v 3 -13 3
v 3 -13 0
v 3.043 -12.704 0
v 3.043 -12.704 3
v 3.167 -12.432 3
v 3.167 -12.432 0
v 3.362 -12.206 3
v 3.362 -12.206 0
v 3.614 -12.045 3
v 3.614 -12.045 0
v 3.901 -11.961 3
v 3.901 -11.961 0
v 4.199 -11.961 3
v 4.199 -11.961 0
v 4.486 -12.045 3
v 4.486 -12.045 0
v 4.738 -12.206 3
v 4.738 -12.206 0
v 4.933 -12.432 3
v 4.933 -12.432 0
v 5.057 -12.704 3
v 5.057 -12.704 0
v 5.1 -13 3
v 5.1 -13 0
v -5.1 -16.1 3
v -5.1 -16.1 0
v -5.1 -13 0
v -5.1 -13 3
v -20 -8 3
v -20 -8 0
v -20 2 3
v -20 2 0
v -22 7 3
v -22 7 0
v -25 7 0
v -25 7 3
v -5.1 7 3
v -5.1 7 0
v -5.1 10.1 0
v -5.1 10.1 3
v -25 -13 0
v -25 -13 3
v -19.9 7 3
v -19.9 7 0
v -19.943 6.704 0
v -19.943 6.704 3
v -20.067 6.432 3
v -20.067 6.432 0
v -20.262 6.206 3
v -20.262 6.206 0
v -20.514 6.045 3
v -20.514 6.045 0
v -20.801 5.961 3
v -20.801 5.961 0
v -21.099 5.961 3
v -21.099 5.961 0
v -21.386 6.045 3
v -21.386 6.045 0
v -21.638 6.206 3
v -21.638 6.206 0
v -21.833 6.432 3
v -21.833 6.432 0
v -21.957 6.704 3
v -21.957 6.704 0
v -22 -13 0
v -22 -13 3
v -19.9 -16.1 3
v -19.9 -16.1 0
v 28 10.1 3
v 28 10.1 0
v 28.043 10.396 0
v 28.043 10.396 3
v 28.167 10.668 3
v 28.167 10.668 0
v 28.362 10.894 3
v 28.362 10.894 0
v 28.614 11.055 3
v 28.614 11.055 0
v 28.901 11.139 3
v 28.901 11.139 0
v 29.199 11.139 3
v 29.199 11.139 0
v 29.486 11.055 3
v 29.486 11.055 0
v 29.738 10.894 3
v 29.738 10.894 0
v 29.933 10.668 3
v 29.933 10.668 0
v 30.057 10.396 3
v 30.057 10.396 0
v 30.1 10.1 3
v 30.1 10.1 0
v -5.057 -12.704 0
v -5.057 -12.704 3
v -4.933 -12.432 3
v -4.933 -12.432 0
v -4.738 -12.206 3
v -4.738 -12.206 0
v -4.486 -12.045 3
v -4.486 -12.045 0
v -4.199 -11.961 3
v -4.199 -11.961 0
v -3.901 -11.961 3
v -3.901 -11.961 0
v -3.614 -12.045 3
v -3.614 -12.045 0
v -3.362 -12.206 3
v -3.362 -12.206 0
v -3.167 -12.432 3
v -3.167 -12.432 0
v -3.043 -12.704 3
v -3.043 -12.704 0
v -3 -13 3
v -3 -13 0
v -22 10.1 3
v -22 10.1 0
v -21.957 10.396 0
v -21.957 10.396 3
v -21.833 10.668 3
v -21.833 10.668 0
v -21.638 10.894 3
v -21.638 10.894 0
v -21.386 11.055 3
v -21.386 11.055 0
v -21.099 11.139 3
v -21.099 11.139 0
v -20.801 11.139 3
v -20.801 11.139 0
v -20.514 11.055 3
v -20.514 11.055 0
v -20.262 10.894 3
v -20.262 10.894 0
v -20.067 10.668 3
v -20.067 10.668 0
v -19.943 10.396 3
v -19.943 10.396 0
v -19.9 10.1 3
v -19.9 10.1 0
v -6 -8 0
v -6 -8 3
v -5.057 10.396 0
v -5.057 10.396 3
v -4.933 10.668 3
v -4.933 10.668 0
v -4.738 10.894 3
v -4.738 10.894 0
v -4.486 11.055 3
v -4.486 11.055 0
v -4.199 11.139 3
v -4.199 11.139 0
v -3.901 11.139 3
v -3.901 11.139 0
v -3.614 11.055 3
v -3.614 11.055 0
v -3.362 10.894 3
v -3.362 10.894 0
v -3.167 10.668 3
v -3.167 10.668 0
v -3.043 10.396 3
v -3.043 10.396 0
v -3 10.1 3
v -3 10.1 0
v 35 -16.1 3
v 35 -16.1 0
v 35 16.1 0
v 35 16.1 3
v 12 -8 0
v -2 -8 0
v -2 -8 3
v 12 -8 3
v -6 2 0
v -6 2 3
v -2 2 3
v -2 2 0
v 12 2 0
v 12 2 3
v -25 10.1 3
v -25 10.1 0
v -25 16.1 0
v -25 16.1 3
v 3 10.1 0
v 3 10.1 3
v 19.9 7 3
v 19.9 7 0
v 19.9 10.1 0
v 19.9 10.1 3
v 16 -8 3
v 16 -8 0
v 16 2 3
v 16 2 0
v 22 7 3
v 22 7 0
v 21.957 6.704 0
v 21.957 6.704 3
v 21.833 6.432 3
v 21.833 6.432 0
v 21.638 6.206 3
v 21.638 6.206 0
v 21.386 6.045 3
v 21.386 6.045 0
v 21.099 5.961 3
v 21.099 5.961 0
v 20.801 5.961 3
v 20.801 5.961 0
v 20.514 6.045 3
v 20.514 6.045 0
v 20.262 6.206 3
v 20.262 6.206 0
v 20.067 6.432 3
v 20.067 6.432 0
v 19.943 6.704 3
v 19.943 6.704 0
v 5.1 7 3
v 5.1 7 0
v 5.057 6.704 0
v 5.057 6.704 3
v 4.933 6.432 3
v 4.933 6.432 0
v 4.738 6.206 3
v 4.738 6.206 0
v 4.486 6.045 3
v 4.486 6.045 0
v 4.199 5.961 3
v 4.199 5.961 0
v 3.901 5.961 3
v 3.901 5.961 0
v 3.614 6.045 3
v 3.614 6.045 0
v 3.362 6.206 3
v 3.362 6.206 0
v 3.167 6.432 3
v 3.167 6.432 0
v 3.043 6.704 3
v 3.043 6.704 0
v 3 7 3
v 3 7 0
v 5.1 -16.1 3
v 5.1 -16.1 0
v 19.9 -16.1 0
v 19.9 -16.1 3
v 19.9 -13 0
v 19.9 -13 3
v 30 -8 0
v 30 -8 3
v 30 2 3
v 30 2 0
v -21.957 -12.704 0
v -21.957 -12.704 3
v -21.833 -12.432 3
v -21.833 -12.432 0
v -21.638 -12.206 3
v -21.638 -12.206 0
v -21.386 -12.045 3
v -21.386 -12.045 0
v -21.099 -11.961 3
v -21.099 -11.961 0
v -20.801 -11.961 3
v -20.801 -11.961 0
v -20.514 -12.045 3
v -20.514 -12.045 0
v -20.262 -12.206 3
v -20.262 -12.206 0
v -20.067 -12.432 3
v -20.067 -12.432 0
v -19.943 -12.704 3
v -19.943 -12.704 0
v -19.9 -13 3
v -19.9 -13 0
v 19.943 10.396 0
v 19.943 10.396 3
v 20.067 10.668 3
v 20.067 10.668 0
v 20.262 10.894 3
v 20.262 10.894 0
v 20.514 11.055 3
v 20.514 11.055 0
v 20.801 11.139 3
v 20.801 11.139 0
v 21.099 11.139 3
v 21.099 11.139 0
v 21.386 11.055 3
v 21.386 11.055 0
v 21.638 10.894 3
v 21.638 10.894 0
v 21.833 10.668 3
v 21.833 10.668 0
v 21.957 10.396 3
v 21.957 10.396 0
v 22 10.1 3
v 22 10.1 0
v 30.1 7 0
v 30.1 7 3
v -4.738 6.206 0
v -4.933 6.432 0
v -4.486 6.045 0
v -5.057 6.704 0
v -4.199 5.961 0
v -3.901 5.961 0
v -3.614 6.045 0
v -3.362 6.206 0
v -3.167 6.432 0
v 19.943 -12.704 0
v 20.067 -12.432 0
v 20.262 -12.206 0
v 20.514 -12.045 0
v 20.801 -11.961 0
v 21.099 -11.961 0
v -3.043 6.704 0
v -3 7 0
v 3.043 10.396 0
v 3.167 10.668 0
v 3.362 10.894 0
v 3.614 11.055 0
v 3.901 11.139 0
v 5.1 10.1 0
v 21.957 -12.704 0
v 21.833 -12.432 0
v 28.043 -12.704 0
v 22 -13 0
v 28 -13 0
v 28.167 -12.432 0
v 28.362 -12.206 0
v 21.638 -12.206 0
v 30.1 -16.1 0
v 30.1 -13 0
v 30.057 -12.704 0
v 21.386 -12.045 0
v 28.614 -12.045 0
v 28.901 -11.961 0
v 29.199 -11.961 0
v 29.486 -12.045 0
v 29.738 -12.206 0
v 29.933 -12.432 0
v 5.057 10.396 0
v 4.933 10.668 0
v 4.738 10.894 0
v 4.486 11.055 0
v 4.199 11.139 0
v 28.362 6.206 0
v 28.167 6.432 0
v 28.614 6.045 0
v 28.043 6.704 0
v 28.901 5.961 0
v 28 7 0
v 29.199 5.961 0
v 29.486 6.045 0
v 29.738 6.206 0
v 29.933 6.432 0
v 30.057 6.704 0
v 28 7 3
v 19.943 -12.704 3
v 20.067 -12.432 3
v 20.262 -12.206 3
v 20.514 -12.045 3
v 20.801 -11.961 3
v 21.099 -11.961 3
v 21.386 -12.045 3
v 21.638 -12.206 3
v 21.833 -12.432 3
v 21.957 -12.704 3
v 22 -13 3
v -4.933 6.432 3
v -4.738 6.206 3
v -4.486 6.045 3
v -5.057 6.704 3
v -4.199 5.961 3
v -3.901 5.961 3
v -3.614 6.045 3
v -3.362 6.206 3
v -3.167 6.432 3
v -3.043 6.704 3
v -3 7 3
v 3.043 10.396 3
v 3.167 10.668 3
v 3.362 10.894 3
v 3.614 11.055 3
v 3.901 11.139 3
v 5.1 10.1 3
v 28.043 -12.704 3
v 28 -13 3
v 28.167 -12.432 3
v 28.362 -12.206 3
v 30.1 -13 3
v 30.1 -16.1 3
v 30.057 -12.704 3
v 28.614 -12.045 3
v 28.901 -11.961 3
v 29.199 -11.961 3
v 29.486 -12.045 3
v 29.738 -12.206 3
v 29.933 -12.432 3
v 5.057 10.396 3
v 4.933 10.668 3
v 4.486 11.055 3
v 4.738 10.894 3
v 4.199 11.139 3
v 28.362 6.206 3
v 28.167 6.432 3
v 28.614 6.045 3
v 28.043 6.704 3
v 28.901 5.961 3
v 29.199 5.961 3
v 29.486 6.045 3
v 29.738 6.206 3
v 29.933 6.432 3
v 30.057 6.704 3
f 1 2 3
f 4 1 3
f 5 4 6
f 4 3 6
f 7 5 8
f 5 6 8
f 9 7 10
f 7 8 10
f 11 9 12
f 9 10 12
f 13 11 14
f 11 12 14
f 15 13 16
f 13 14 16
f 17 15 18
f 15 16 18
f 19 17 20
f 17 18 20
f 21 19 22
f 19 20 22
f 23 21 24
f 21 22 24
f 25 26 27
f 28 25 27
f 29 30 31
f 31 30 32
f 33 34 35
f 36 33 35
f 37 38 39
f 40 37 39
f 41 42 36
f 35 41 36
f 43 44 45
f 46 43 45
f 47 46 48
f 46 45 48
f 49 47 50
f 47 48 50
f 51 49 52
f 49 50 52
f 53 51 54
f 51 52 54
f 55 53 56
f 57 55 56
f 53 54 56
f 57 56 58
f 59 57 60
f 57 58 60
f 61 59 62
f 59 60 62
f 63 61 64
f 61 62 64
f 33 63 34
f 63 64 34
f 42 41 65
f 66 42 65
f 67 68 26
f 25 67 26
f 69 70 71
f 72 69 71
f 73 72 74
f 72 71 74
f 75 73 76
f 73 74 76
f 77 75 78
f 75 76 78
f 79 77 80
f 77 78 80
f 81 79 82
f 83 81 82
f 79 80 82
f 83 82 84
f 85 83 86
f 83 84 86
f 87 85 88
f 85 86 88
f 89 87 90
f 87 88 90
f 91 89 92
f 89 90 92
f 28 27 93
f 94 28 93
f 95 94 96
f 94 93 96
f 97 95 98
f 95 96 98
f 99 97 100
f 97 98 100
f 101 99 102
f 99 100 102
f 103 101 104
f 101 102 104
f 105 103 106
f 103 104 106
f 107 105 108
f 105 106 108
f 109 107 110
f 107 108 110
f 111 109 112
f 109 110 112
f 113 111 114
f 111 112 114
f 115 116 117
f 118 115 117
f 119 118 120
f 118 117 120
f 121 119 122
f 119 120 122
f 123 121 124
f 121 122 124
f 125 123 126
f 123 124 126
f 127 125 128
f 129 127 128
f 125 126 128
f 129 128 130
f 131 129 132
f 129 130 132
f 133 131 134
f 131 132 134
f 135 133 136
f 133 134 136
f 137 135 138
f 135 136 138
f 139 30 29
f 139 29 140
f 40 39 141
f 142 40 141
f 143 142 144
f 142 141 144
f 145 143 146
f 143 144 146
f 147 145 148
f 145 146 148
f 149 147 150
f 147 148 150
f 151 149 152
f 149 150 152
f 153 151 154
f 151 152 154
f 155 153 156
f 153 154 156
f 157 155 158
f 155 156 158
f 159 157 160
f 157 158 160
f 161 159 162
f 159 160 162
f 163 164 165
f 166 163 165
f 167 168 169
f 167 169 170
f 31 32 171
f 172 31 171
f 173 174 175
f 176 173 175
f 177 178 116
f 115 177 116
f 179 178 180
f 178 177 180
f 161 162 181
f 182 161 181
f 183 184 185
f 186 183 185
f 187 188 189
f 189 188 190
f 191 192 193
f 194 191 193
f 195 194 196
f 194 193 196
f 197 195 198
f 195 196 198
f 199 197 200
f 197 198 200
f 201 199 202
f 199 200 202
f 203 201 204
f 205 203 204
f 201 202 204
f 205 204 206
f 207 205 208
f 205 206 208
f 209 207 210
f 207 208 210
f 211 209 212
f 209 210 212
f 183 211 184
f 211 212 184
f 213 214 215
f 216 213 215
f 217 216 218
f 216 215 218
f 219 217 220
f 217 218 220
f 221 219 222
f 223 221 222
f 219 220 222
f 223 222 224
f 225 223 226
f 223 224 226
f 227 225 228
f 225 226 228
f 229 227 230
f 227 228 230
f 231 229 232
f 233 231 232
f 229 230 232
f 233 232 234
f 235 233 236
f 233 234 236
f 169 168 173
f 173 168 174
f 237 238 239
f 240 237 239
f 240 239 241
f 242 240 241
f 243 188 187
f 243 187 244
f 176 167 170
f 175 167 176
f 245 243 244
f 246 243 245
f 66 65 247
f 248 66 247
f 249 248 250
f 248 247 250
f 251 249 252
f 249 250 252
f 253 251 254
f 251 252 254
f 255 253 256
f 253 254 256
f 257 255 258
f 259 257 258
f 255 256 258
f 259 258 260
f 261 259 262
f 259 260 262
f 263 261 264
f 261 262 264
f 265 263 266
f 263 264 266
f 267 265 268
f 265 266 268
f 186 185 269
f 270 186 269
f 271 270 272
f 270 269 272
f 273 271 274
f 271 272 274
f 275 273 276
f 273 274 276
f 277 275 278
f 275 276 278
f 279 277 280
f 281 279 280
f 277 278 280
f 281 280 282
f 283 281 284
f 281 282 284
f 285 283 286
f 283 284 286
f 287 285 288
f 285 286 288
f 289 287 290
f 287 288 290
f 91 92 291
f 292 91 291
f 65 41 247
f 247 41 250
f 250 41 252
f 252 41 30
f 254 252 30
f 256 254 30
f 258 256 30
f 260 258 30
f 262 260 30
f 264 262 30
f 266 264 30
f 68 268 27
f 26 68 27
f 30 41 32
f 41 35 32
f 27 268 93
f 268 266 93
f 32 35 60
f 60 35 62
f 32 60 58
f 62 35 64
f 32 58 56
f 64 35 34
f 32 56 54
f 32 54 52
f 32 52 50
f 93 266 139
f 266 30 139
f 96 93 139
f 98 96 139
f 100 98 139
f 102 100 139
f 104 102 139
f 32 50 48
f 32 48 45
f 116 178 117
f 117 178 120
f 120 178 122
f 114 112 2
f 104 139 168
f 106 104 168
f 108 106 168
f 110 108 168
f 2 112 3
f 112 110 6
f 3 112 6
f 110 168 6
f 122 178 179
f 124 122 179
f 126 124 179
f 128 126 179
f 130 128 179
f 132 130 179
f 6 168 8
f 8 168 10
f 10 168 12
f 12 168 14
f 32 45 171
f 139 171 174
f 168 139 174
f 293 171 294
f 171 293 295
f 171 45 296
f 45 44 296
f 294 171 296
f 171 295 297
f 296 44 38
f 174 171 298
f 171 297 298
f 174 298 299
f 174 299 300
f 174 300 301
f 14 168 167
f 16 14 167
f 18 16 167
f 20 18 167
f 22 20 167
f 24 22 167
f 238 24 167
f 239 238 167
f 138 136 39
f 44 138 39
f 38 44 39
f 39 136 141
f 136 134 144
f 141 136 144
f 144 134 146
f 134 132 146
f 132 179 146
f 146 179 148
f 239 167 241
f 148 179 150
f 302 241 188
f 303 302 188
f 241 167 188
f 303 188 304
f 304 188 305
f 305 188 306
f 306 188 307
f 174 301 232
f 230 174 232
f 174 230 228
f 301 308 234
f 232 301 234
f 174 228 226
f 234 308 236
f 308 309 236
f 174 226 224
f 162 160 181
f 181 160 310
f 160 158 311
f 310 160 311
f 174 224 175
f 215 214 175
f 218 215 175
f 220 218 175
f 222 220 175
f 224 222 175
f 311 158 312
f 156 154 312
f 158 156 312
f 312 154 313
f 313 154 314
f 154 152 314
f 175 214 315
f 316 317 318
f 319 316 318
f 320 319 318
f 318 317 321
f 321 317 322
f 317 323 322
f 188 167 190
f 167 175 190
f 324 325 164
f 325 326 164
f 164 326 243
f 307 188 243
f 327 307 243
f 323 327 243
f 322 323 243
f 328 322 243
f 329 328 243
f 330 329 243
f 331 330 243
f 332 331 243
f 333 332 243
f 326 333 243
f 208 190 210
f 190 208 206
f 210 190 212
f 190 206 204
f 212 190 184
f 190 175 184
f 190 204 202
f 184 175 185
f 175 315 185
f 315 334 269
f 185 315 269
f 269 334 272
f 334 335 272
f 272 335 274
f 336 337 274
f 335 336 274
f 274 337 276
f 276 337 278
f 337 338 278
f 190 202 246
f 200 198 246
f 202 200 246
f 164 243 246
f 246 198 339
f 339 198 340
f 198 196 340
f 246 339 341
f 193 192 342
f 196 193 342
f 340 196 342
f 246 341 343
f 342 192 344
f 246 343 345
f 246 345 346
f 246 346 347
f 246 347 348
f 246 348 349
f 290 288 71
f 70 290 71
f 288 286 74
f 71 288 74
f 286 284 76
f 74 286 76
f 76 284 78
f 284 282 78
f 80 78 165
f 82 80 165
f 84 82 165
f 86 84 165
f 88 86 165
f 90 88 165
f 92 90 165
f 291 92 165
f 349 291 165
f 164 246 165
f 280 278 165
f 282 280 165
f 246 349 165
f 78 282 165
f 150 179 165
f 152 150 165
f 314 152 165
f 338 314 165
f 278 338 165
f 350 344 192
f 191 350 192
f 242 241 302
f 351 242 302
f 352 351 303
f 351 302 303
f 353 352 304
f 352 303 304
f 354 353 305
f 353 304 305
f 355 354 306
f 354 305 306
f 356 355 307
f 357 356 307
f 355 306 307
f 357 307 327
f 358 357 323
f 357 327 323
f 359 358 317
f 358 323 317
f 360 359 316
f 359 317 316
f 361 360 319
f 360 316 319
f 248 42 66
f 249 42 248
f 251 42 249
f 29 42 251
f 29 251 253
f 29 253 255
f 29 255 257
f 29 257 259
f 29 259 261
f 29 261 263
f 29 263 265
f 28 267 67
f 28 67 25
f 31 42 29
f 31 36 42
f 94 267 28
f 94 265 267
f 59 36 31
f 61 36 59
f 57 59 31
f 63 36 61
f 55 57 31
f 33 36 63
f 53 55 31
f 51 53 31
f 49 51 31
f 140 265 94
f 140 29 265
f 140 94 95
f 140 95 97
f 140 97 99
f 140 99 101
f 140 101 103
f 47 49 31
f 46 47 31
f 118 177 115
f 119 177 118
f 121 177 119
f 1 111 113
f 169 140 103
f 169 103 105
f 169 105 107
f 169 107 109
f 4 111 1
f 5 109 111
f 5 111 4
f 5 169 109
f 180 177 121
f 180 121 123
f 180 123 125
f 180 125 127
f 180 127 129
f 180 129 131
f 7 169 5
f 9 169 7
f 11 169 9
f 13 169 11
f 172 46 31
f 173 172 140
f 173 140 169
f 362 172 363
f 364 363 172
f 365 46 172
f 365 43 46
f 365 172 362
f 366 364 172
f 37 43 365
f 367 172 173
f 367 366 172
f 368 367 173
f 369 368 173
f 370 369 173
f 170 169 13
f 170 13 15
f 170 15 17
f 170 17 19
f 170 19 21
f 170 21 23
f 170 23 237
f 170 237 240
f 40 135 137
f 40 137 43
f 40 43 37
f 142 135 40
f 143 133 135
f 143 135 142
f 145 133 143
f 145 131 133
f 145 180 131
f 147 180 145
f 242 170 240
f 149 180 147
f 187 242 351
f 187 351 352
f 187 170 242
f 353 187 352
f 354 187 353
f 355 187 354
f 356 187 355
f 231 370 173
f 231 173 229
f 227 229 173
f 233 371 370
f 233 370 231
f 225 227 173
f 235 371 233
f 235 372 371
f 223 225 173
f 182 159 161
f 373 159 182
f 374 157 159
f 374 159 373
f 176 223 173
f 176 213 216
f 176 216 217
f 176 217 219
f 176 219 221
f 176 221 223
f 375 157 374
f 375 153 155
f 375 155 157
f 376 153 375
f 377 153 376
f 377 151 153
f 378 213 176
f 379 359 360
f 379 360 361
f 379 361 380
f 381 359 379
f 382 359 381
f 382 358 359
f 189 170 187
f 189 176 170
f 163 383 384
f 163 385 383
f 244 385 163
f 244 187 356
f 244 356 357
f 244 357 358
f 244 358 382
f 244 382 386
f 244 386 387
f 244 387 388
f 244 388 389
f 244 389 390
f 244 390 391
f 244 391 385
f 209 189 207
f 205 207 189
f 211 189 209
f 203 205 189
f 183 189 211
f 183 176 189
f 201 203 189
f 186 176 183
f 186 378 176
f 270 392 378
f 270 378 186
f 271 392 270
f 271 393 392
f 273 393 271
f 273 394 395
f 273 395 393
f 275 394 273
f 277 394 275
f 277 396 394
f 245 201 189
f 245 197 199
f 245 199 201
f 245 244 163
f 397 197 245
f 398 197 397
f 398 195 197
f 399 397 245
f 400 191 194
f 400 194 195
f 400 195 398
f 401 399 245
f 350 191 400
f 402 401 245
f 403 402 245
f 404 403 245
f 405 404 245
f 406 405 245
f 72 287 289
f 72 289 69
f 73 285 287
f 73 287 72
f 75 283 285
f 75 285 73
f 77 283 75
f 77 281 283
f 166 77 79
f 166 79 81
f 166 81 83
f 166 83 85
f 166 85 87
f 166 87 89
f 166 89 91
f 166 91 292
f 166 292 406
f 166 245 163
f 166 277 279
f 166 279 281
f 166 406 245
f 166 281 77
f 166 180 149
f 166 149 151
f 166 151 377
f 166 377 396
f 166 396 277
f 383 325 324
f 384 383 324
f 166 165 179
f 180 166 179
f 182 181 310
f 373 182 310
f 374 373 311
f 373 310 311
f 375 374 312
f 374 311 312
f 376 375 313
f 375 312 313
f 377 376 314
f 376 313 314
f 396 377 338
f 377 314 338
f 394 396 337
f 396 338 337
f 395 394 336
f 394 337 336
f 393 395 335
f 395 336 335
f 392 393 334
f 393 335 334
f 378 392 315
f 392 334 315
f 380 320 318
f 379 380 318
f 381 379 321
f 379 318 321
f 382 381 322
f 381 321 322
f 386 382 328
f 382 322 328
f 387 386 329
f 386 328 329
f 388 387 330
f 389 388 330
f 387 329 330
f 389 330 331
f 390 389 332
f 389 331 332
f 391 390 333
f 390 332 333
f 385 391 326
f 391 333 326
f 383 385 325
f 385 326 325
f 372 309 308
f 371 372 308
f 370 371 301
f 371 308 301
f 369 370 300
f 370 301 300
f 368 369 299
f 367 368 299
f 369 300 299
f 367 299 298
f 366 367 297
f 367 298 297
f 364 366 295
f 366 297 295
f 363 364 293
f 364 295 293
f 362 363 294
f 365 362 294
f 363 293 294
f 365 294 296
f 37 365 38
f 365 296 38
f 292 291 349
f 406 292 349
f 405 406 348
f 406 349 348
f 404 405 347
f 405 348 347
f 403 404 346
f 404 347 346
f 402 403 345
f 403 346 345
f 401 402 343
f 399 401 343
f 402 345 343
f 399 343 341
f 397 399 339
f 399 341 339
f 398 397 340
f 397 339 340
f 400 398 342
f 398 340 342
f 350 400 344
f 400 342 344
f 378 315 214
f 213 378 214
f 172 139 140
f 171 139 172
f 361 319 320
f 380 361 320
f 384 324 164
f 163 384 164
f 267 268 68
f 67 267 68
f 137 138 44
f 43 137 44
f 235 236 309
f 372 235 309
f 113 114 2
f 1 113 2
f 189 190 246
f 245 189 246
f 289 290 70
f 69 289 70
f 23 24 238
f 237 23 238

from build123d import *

# Parameters (mm, degrees)
SKETCH_1_W          = 14
SKETCH_1_H          = 10
EXTRUDE_1_DEPTH     = 3
SKETCH_2_W          = 10
SKETCH_2_H          = 32.2
CUT_EXTRUDE_1_DEPTH = 10


with BuildPart() as part:
    # 草图1 → 凸台-拉伸1 (new body)
    with BuildSketch(Plane.XY):
        with BuildLine():
            Line((-19.9, -16.1), (-5.1, -16.1))
            Line((-5.1, -16.1), (-5.1, -13))
            ThreePointArc((-5.1, -13), (-4.05, -11.95), (-3, -13))
            Line((-3, -13), (3, -13))
            ThreePointArc((3, -13), (4.05, -11.95), (5.1, -13))
            Line((5.1, -13), (5.1, -16.1))
            Line((5.1, -16.1), (19.9, -16.1))
            Line((19.9, -16.1), (19.9, -13))
            ThreePointArc((19.9, -13), (20.95, -11.95), (22, -13))
            Line((22, -13), (28, -13))
            ThreePointArc((28, -13), (29.05, -11.95), (30.1, -13))
            Line((30.1, -13), (30.1, -16.1))
            Line((30.1, -16.1), (35, -16.1))
            Line((35, -16.1), (35, 16.1))
            Line((35, 16.1), (-35, 16.1))
            Line((-35, 16.1), (-35, -16.1))
            Line((-35, -16.1), (-30.1, -16.1))
            Line((-30.1, -16.1), (-30.1, -13))
            ThreePointArc((-30.1, -13), (-29.05, -11.95), (-28, -13))
            Line((-28, -13), (-22, -13))
            ThreePointArc((-22, -13), (-20.95, -11.95), (-19.9, -13))
            Line((-19.9, -13), (-19.9, -16.1))
        make_face()
        with Locations((-13, -3)):
            Rectangle(SKETCH_1_W, SKETCH_1_H, mode=Mode.SUBTRACT)
        with Locations((5, -3)):
            Rectangle(SKETCH_1_W, SKETCH_1_H, mode=Mode.SUBTRACT)
        with Locations((23, -3)):
            Rectangle(SKETCH_1_W, SKETCH_1_H, mode=Mode.SUBTRACT)
        with BuildLine():
            Line((-22, 7), (-28, 7))
            ThreePointArc((-28, 7), (-29.05, 5.95), (-30.1, 7))
            Line((-30.1, 7), (-30.1, 10.1))
            ThreePointArc((-30.1, 10.1), (-29.05, 11.15), (-28, 10.1))
            Line((-28, 10.1), (-22, 10.1))
            ThreePointArc((-22, 10.1), (-20.95, 11.15), (-19.9, 10.1))
            Line((-19.9, 10.1), (-19.9, 7))
            ThreePointArc((-19.9, 7), (-20.95, 5.95), (-22, 7))
        make_face(mode=Mode.SUBTRACT)
        with BuildLine():
            Line((3, 7), (-3, 7))
            ThreePointArc((-3, 7), (-4.05, 5.95), (-5.1, 7))
            Line((-5.1, 7), (-5.1, 10.1))
            ThreePointArc((-5.1, 10.1), (-4.05, 11.15), (-3, 10.1))
            Line((-3, 10.1), (3, 10.1))
            ThreePointArc((3, 10.1), (4.05, 11.15), (5.1, 10.1))
            Line((5.1, 10.1), (5.1, 7))
            ThreePointArc((5.1, 7), (4.05, 5.95), (3, 7))
        make_face(mode=Mode.SUBTRACT)
        with BuildLine():
            Line((30.1, 10.1), (30.1, 7))
            ThreePointArc((30.1, 7), (29.05, 5.95), (28, 7))
            Line((28, 7), (22, 7))
            ThreePointArc((22, 7), (20.95, 5.95), (19.9, 7))
            Line((19.9, 7), (19.9, 10.1))
            ThreePointArc((19.9, 10.1), (20.95, 11.15), (22, 10.1))
            Line((22, 10.1), (28, 10.1))
            ThreePointArc((28, 10.1), (29.05, 11.15), (30.1, 10.1))
        make_face(mode=Mode.SUBTRACT)
    extrude(amount=EXTRUDE_1_DEPTH)

    # 草图2 → 切除-拉伸1 (cut)
    with BuildSketch(Plane.XY.offset(3)):
        with Locations((-30, 0)):
            Rectangle(SKETCH_2_W, SKETCH_2_H)
    extrude(amount=-CUT_EXTRUDE_1_DEPTH, mode=Mode.SUBTRACT)


solid = part.part
